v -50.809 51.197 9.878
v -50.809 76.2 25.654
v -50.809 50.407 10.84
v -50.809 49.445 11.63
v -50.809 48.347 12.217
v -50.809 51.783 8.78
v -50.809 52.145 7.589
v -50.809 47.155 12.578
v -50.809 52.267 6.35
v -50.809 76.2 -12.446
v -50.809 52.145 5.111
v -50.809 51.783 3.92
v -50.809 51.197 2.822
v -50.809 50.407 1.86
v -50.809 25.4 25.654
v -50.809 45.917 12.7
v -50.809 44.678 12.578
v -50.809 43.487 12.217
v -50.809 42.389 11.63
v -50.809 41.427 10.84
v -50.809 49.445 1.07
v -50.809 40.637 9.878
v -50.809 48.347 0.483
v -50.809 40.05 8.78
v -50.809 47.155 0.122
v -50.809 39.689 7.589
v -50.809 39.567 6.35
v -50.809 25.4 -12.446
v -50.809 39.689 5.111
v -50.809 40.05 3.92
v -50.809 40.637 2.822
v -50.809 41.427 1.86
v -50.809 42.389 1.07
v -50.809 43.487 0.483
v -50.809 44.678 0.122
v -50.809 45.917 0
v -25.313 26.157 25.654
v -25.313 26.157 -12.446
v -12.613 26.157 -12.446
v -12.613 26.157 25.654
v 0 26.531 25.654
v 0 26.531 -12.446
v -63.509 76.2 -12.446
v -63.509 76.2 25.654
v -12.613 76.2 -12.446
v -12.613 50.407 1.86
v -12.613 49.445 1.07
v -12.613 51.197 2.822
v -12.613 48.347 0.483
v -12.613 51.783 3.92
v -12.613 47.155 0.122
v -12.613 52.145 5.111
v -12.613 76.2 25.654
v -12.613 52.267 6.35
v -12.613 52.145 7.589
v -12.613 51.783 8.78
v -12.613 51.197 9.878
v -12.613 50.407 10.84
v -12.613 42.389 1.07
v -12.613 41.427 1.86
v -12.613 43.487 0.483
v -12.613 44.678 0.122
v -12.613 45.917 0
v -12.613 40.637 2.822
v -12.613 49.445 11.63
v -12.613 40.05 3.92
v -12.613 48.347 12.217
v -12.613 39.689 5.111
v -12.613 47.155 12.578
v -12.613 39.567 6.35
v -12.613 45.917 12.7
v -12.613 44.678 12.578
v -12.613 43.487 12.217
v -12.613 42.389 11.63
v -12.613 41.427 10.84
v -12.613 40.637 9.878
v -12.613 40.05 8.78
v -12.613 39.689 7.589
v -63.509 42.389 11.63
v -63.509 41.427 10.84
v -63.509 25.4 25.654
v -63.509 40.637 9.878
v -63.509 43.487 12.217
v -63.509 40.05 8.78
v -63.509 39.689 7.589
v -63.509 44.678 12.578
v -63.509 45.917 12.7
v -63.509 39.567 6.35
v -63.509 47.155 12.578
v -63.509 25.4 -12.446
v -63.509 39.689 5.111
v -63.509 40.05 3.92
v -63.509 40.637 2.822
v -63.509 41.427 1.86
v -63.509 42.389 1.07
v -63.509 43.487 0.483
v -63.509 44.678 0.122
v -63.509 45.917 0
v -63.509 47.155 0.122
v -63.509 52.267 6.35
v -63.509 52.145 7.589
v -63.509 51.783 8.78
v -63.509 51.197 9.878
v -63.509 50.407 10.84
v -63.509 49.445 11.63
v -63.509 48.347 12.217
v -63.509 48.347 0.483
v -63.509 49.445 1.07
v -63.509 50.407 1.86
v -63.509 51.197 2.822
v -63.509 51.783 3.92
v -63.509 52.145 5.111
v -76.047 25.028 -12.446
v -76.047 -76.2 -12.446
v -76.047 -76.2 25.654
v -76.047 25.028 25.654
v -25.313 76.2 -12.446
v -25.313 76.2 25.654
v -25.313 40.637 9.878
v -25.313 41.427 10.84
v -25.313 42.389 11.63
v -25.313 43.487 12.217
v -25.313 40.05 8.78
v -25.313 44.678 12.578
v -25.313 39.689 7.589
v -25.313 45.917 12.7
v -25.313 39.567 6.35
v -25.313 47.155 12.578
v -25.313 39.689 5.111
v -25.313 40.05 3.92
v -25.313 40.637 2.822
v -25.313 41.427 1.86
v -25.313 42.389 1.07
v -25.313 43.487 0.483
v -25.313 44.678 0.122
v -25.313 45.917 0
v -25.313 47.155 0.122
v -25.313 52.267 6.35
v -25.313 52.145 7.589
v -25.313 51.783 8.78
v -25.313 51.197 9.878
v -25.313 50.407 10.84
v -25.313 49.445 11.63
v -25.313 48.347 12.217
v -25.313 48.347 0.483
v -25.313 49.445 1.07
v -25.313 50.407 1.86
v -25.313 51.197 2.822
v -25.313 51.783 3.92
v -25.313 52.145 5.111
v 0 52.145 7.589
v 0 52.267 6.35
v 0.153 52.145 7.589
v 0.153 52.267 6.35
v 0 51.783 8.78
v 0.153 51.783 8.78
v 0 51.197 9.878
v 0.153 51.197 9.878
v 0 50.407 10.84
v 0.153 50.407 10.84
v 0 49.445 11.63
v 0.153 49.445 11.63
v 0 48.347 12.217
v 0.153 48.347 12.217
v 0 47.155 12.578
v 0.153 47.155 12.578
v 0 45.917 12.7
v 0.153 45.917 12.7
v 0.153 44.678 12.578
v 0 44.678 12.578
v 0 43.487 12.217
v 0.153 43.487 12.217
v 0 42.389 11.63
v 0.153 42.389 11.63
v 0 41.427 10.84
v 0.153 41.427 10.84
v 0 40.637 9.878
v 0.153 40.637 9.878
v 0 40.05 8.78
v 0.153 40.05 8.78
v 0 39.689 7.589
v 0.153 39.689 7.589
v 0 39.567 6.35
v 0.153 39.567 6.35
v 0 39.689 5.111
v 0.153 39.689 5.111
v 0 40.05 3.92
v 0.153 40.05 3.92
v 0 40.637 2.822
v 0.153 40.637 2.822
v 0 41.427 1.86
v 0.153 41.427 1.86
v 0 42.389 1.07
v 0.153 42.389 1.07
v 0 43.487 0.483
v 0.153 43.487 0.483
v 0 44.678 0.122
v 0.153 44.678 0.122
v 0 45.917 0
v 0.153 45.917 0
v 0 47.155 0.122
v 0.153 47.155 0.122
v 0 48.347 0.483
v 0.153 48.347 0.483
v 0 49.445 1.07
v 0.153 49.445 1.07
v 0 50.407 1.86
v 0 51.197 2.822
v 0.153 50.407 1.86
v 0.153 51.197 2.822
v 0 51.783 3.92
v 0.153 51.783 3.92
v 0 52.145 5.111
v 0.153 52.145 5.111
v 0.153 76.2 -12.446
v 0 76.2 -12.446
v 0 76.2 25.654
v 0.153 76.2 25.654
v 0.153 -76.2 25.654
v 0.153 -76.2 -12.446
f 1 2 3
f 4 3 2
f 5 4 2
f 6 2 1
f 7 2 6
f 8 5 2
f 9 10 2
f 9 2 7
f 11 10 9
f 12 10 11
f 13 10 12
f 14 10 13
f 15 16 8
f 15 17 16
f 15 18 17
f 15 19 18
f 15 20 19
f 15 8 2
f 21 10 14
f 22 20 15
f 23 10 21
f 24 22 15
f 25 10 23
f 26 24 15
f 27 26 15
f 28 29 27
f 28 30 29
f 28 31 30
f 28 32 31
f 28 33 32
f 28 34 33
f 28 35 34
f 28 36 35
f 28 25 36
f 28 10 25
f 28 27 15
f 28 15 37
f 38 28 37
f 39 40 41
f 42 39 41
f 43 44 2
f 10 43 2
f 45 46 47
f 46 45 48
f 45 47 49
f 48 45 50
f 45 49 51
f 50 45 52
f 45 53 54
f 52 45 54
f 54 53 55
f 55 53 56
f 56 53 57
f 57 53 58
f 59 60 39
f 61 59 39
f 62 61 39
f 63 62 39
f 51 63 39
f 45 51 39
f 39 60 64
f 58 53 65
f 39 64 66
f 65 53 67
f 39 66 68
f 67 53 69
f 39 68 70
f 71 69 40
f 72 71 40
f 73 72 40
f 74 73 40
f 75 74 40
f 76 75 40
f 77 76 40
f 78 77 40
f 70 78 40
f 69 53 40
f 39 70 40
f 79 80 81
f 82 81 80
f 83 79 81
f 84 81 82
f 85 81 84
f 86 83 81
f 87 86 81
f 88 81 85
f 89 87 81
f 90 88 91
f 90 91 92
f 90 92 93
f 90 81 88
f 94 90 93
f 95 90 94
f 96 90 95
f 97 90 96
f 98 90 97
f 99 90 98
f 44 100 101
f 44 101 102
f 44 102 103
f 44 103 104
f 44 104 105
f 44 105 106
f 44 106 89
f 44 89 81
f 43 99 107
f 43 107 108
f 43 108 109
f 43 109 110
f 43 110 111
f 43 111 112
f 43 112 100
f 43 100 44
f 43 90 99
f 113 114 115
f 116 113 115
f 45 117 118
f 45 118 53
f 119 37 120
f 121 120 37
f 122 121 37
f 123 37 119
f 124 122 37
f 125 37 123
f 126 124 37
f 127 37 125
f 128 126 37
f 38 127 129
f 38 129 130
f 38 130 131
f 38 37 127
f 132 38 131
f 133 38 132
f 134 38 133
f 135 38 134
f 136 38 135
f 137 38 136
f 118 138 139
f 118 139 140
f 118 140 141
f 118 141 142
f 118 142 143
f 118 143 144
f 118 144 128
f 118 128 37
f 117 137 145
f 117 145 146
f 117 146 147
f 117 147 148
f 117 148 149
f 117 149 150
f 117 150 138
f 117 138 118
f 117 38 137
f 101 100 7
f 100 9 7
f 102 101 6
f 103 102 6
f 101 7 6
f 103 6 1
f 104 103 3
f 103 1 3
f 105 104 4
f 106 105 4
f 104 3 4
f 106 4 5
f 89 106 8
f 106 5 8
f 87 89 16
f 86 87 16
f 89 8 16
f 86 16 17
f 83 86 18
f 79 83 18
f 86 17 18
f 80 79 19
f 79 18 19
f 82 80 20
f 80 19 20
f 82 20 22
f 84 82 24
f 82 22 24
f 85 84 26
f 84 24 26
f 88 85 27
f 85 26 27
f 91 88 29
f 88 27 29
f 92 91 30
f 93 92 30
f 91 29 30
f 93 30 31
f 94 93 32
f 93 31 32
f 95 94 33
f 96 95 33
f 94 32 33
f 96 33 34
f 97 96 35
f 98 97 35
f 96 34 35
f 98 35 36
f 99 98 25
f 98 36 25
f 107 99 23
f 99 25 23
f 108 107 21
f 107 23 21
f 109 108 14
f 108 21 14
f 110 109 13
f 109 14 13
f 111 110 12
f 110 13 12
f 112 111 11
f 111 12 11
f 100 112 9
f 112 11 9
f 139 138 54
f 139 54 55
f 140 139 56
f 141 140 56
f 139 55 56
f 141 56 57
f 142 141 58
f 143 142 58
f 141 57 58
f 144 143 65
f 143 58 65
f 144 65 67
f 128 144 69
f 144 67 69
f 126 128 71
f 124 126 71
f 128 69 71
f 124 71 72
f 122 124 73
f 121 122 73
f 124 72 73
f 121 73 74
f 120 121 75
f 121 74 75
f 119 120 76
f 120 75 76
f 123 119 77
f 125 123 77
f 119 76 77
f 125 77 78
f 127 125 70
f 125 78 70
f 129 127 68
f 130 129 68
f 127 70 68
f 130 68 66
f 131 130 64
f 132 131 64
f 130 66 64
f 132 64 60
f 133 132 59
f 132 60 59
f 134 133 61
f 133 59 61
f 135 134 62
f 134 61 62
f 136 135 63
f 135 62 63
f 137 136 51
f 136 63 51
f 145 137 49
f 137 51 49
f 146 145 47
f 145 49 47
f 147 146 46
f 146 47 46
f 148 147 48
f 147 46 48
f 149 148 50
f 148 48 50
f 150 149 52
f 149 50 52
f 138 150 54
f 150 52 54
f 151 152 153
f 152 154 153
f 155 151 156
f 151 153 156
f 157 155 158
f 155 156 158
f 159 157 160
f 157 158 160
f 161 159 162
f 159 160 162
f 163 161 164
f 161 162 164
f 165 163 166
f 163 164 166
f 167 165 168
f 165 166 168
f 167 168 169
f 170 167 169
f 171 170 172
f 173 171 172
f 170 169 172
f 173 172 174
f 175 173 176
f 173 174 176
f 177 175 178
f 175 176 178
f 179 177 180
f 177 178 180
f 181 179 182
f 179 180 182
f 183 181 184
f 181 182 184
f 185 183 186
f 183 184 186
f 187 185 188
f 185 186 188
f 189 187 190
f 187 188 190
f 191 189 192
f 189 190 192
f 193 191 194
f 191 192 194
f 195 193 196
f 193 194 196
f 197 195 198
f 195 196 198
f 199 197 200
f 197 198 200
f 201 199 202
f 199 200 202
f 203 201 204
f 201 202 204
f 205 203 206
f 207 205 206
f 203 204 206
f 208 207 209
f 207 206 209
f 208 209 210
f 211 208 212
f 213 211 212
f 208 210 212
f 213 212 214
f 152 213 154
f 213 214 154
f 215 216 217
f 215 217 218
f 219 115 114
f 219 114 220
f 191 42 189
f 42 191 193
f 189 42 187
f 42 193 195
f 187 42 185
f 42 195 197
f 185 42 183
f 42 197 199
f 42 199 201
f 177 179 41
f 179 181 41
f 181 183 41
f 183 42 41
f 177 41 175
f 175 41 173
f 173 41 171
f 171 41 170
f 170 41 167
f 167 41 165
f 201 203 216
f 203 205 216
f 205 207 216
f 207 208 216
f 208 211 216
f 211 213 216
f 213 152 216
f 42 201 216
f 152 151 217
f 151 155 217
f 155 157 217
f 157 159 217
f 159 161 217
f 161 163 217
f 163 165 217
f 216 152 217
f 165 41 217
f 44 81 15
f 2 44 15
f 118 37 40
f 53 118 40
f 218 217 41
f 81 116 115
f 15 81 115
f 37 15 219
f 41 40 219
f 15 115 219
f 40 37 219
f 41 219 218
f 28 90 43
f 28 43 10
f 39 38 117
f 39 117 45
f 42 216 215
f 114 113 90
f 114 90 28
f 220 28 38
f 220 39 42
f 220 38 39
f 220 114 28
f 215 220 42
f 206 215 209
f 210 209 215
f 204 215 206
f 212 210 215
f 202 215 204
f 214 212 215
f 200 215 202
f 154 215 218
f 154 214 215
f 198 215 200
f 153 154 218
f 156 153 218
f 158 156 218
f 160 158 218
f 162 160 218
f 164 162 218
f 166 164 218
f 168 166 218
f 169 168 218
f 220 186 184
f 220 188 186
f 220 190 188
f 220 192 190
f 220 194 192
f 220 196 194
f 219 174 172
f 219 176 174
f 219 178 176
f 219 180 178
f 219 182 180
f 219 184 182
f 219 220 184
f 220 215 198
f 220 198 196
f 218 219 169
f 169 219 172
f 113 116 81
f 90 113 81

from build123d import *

# Parameters (mm, degrees)
F0_W     = 76.2
F0_H     = 38.1
F1_DEPTH = 76.2
F3_R     = 6.35
F4_DEPTH = 85.344
F6_DEPTH = 50.8


with BuildPart() as f1:
    # F0 (on Front) → F1 (new body, symmetric)
    with BuildSketch(Plane.XZ):
        with Locations((-179.678692, 19.05)):
            Rectangle(F0_W, F0_H)
    extrude(amount=F1_DEPTH, both=True)


with BuildPart() as f1_1:
    # F2: moved
    add(f1.part.moved(Location((141.732, 0, -12.446))))

    # F3 (on Right) → F4 (cut, symmetric)
    with BuildSketch(Plane.YZ):
        with Locations((45.916668, 6.35)):
            Circle(F3_R)
    extrude(amount=F4_DEPTH, both=True, mode=Mode.SUBTRACT)

    # F5 (on Top) → F6 (cut, symmetric)
    with BuildSketch(Plane.XY):
        Polygon((-63.508823, 25.400016), (-63.508823, 76.200016), (-76.920537, 76.956743), (-76.920537, 25.001949), align=None)
        Polygon((-25.313061, 76.956743), (-50.808823, 76.200016), (-50.808823, 25.400016), (-25.313061, 26.156743), align=None)
        Polygon((0, 76.200016), (-12.613061, 76.956743), (-12.613061, 26.156743), (0, 26.531105), align=None)
    extrude(amount=F6_DEPTH, both=True, mode=Mode.SUBTRACT)


solid = f1_1.part
